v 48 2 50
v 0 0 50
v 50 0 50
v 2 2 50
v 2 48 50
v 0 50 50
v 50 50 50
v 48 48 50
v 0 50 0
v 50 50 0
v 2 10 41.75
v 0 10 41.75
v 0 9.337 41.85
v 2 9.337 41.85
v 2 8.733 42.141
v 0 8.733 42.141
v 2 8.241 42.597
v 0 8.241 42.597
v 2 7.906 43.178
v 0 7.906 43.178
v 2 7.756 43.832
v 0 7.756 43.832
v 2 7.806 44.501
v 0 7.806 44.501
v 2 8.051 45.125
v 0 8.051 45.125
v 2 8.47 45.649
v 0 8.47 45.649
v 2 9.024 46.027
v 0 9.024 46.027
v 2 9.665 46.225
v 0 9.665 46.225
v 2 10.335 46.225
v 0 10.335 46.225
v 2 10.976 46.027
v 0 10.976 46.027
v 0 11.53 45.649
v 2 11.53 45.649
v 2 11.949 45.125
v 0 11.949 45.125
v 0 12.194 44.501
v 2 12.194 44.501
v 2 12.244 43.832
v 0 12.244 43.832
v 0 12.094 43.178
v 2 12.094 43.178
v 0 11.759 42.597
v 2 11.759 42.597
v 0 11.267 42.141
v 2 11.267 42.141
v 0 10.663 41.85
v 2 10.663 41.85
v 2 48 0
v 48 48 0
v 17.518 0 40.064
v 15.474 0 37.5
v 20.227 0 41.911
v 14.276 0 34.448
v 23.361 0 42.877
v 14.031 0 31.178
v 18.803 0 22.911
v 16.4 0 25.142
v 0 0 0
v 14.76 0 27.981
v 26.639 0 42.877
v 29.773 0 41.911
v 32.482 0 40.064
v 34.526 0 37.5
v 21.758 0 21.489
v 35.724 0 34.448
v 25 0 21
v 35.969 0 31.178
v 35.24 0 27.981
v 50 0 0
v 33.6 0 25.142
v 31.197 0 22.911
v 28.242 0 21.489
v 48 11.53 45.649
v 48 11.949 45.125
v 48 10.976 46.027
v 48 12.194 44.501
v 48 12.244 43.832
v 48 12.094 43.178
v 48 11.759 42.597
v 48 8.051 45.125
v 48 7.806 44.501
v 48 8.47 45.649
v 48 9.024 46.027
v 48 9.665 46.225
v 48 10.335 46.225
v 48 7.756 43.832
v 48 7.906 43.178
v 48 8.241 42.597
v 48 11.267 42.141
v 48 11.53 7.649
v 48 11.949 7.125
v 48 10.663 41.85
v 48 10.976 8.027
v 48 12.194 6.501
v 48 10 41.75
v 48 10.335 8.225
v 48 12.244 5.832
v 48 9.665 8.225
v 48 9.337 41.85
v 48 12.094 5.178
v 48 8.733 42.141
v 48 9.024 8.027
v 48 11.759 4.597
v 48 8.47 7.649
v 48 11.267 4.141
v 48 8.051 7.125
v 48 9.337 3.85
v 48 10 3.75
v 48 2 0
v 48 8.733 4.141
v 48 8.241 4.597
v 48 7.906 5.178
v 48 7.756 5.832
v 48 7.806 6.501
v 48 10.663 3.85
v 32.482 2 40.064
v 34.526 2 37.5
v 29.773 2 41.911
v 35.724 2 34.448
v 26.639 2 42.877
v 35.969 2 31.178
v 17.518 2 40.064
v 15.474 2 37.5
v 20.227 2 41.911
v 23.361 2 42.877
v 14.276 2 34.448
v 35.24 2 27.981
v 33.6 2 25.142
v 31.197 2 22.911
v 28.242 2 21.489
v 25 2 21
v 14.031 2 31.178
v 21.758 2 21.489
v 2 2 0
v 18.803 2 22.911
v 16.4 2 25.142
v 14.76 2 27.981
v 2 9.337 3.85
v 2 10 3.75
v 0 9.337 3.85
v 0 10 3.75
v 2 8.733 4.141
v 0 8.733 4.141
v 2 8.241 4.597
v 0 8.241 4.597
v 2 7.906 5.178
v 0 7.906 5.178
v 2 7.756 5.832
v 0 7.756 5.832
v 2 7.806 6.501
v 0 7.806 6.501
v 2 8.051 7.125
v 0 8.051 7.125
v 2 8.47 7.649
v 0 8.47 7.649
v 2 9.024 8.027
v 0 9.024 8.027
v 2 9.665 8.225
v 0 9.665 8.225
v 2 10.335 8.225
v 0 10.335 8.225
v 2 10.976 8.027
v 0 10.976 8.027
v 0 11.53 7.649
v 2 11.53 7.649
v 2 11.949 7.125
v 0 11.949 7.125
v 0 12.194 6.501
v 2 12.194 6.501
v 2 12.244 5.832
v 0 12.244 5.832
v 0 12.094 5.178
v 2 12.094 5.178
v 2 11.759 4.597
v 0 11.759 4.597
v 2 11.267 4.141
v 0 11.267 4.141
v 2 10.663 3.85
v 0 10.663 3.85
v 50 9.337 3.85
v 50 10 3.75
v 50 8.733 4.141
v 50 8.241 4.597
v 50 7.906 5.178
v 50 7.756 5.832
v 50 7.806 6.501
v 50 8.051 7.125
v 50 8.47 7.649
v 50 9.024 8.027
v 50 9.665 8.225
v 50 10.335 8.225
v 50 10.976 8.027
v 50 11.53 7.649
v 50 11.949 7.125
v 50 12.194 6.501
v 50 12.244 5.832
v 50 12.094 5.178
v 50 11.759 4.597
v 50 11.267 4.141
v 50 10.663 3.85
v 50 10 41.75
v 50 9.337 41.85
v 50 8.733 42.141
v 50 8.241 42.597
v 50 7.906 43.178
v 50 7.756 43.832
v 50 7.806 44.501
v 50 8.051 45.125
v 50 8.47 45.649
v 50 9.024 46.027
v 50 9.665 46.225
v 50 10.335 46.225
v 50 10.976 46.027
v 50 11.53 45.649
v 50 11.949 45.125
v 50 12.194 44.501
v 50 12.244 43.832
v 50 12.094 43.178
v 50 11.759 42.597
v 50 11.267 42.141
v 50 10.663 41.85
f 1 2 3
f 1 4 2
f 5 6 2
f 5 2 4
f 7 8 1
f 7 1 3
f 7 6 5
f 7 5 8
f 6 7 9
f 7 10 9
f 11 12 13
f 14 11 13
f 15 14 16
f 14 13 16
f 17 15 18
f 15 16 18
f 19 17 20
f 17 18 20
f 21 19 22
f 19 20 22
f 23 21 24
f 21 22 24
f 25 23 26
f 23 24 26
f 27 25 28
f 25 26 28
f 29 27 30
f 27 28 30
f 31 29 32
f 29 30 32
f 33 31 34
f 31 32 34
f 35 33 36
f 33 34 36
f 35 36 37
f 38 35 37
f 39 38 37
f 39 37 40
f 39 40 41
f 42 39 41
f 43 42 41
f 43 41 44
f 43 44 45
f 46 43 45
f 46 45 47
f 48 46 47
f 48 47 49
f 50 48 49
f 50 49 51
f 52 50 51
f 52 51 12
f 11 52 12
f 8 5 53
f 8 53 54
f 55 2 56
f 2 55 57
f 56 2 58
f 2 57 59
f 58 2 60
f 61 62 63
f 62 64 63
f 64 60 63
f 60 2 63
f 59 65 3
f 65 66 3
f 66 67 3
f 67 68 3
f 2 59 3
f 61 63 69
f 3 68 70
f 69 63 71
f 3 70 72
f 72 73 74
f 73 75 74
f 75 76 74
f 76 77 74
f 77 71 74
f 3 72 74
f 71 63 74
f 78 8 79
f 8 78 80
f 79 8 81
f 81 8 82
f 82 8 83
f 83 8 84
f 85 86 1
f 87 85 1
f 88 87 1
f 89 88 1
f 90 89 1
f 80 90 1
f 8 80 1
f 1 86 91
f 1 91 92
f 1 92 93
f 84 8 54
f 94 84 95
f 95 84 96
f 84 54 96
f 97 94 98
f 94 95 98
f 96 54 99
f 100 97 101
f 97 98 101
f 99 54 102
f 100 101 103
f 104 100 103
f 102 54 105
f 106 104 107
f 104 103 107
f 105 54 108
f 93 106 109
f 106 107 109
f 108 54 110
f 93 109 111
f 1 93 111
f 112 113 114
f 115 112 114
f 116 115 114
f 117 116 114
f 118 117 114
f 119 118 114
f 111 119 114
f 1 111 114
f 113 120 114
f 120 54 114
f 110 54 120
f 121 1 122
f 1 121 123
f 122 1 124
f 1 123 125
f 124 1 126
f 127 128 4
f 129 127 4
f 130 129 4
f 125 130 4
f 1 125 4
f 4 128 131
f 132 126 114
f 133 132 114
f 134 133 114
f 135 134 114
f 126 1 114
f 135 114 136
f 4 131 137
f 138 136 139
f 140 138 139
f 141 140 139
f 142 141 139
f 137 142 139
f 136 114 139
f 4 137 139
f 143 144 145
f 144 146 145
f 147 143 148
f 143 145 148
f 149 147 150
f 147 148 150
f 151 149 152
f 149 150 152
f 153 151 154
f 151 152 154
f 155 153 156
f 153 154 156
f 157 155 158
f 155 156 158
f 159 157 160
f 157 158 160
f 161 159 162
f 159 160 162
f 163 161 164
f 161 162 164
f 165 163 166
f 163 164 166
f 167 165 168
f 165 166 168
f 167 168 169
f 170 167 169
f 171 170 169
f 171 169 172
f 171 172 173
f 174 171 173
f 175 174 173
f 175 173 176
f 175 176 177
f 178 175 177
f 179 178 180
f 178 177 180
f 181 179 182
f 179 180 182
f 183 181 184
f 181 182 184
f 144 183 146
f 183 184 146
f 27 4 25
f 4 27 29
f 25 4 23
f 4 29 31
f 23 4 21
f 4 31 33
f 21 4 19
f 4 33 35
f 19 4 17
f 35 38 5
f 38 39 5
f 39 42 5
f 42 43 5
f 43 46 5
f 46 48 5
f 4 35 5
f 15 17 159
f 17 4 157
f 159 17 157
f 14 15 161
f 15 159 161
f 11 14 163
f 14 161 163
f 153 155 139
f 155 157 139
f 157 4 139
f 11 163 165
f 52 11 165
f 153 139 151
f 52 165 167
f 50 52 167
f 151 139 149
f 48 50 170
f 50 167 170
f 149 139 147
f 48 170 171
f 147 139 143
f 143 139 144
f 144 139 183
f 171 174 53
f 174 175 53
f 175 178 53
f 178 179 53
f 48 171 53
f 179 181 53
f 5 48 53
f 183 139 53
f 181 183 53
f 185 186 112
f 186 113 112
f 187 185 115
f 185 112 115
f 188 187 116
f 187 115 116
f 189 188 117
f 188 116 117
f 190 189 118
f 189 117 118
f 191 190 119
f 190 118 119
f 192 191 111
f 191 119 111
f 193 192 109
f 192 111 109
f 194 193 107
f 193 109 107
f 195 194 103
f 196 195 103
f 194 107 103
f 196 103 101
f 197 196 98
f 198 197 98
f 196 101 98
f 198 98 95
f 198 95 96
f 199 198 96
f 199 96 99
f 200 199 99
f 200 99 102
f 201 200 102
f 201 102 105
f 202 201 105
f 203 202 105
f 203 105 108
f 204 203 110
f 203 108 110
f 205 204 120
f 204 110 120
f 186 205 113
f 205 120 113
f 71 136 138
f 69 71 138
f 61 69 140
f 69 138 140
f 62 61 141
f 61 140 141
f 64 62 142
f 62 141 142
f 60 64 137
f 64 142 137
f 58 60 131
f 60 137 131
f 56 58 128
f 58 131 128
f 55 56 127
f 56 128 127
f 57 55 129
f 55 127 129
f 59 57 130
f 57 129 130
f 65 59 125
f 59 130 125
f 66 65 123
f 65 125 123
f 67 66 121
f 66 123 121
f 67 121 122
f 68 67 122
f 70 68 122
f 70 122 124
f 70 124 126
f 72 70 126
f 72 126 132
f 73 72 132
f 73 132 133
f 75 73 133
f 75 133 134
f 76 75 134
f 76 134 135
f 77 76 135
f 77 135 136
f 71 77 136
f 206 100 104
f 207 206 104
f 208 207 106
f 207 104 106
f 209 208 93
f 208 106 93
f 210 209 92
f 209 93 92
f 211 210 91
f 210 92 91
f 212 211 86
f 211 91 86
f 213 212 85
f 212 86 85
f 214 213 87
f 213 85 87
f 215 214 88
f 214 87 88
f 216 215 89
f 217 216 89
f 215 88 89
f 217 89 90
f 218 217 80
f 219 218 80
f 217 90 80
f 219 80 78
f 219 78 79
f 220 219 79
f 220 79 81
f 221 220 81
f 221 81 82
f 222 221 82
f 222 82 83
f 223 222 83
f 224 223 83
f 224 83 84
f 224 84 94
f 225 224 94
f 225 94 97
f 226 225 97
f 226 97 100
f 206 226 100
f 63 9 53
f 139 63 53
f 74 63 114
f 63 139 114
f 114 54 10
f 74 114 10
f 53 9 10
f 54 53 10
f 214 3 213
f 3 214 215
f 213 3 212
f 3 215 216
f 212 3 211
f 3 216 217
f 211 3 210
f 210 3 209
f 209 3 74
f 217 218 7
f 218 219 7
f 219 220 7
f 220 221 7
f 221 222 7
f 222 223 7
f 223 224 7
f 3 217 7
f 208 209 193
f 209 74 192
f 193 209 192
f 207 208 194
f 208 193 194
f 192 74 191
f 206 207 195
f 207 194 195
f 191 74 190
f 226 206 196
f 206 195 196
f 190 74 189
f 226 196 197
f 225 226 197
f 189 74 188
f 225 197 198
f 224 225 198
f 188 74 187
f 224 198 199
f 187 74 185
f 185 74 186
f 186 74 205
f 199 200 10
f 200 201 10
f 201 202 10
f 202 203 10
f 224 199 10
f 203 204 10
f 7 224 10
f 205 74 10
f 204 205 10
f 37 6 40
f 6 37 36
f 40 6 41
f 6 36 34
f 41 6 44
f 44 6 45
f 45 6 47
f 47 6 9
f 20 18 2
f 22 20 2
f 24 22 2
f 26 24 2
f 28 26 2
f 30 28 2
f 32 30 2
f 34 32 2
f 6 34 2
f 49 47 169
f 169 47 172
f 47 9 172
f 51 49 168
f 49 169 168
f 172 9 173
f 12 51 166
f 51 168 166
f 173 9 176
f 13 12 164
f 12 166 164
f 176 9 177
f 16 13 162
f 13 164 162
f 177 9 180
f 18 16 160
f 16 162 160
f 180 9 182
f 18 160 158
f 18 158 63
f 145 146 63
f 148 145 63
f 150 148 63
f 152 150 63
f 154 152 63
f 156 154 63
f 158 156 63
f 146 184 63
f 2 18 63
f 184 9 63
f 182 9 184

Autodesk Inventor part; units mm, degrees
ref_plane "YZ Plane" through (0, 0, 0) normal (1, 0, 0) x (0, 1, 0)
ref_plane "XZ Plane" through (0, 0, 0) normal (0, 1, 0) x (-1, 0, 0)
ref_plane "XY Plane" through (0, 0, 0) normal (0, 0, 1) x (1, 0, 0)
sketch "スケッチ1" plane through (0, 0, 0) normal (0, 0, 1) x (1, 0, 0)
  line L0 (0, 0) -> (50, 0)
  line L1 (50, 0) -> (50, 50)
  line L2 (50, 50) -> (0, 50)
  line L3 (0, 50) -> (0, 0)
  line L4 (2, 48) -> (48, 48)
  line L5 (48, 48) -> (48, 2)
  line L6 (48, 2) -> (2, 2)
  line L7 (2, 2) -> (2, 48)
  dimension "d0" = 50
  dimension "d1" = 2
extrude "押し出し1" add sketch "スケッチ1" along normal blind 50
sketch "スケッチ2" plane through (0, 50, 0) normal (0, 1, 0) x (1, 0, 0)
  point P0 (0, 0)
sketch "スケッチ3" plane through (50, 0, 0) normal (1, 0, 0) x (0, 0, -1)
  line L0 (0, 0) -> (0, 50) projected
  line L1 (0, 50) -> (-50, 50) projected
  line L2 (-50, 0) -> (-50, 50) projected
  line L3 (0, 0) -> (-50, 0) projected
  line L4 (-50, 10) -> (0, 10) construction
  line L5 (-25, 50) -> (-25, 0) construction
  point P0 (-44, 10)
  point P1 (-6, 10)
  dimension "d5" = 6
  dimension "d21" = 10
hole "穴1" at (50, 10, 44) at (50, 10, 6) direction (-1, 0, 0) diameter 4.5 end through all
sketch "スケッチ4" plane through (0, 0, 0) normal (0, -1, 0) x (1, 0, 0)
  line L0 (0, 0) -> (50, 0) projected
  line L1 (50, 0) -> (50, 50) projected
  line L2 (0, 50) -> (50, 50) projected
  line L3 (0, 0) -> (0, 50) projected
  line L4 (25, 50) -> (25, 0) construction
  point P0 (25, 32)
  dimension "d20" = 18
hole "穴2" at (25, 0, 32) direction (0, 1, 0) diameter 22 depth 2
properties part number "ankle" material "アルミニウム 6061"
